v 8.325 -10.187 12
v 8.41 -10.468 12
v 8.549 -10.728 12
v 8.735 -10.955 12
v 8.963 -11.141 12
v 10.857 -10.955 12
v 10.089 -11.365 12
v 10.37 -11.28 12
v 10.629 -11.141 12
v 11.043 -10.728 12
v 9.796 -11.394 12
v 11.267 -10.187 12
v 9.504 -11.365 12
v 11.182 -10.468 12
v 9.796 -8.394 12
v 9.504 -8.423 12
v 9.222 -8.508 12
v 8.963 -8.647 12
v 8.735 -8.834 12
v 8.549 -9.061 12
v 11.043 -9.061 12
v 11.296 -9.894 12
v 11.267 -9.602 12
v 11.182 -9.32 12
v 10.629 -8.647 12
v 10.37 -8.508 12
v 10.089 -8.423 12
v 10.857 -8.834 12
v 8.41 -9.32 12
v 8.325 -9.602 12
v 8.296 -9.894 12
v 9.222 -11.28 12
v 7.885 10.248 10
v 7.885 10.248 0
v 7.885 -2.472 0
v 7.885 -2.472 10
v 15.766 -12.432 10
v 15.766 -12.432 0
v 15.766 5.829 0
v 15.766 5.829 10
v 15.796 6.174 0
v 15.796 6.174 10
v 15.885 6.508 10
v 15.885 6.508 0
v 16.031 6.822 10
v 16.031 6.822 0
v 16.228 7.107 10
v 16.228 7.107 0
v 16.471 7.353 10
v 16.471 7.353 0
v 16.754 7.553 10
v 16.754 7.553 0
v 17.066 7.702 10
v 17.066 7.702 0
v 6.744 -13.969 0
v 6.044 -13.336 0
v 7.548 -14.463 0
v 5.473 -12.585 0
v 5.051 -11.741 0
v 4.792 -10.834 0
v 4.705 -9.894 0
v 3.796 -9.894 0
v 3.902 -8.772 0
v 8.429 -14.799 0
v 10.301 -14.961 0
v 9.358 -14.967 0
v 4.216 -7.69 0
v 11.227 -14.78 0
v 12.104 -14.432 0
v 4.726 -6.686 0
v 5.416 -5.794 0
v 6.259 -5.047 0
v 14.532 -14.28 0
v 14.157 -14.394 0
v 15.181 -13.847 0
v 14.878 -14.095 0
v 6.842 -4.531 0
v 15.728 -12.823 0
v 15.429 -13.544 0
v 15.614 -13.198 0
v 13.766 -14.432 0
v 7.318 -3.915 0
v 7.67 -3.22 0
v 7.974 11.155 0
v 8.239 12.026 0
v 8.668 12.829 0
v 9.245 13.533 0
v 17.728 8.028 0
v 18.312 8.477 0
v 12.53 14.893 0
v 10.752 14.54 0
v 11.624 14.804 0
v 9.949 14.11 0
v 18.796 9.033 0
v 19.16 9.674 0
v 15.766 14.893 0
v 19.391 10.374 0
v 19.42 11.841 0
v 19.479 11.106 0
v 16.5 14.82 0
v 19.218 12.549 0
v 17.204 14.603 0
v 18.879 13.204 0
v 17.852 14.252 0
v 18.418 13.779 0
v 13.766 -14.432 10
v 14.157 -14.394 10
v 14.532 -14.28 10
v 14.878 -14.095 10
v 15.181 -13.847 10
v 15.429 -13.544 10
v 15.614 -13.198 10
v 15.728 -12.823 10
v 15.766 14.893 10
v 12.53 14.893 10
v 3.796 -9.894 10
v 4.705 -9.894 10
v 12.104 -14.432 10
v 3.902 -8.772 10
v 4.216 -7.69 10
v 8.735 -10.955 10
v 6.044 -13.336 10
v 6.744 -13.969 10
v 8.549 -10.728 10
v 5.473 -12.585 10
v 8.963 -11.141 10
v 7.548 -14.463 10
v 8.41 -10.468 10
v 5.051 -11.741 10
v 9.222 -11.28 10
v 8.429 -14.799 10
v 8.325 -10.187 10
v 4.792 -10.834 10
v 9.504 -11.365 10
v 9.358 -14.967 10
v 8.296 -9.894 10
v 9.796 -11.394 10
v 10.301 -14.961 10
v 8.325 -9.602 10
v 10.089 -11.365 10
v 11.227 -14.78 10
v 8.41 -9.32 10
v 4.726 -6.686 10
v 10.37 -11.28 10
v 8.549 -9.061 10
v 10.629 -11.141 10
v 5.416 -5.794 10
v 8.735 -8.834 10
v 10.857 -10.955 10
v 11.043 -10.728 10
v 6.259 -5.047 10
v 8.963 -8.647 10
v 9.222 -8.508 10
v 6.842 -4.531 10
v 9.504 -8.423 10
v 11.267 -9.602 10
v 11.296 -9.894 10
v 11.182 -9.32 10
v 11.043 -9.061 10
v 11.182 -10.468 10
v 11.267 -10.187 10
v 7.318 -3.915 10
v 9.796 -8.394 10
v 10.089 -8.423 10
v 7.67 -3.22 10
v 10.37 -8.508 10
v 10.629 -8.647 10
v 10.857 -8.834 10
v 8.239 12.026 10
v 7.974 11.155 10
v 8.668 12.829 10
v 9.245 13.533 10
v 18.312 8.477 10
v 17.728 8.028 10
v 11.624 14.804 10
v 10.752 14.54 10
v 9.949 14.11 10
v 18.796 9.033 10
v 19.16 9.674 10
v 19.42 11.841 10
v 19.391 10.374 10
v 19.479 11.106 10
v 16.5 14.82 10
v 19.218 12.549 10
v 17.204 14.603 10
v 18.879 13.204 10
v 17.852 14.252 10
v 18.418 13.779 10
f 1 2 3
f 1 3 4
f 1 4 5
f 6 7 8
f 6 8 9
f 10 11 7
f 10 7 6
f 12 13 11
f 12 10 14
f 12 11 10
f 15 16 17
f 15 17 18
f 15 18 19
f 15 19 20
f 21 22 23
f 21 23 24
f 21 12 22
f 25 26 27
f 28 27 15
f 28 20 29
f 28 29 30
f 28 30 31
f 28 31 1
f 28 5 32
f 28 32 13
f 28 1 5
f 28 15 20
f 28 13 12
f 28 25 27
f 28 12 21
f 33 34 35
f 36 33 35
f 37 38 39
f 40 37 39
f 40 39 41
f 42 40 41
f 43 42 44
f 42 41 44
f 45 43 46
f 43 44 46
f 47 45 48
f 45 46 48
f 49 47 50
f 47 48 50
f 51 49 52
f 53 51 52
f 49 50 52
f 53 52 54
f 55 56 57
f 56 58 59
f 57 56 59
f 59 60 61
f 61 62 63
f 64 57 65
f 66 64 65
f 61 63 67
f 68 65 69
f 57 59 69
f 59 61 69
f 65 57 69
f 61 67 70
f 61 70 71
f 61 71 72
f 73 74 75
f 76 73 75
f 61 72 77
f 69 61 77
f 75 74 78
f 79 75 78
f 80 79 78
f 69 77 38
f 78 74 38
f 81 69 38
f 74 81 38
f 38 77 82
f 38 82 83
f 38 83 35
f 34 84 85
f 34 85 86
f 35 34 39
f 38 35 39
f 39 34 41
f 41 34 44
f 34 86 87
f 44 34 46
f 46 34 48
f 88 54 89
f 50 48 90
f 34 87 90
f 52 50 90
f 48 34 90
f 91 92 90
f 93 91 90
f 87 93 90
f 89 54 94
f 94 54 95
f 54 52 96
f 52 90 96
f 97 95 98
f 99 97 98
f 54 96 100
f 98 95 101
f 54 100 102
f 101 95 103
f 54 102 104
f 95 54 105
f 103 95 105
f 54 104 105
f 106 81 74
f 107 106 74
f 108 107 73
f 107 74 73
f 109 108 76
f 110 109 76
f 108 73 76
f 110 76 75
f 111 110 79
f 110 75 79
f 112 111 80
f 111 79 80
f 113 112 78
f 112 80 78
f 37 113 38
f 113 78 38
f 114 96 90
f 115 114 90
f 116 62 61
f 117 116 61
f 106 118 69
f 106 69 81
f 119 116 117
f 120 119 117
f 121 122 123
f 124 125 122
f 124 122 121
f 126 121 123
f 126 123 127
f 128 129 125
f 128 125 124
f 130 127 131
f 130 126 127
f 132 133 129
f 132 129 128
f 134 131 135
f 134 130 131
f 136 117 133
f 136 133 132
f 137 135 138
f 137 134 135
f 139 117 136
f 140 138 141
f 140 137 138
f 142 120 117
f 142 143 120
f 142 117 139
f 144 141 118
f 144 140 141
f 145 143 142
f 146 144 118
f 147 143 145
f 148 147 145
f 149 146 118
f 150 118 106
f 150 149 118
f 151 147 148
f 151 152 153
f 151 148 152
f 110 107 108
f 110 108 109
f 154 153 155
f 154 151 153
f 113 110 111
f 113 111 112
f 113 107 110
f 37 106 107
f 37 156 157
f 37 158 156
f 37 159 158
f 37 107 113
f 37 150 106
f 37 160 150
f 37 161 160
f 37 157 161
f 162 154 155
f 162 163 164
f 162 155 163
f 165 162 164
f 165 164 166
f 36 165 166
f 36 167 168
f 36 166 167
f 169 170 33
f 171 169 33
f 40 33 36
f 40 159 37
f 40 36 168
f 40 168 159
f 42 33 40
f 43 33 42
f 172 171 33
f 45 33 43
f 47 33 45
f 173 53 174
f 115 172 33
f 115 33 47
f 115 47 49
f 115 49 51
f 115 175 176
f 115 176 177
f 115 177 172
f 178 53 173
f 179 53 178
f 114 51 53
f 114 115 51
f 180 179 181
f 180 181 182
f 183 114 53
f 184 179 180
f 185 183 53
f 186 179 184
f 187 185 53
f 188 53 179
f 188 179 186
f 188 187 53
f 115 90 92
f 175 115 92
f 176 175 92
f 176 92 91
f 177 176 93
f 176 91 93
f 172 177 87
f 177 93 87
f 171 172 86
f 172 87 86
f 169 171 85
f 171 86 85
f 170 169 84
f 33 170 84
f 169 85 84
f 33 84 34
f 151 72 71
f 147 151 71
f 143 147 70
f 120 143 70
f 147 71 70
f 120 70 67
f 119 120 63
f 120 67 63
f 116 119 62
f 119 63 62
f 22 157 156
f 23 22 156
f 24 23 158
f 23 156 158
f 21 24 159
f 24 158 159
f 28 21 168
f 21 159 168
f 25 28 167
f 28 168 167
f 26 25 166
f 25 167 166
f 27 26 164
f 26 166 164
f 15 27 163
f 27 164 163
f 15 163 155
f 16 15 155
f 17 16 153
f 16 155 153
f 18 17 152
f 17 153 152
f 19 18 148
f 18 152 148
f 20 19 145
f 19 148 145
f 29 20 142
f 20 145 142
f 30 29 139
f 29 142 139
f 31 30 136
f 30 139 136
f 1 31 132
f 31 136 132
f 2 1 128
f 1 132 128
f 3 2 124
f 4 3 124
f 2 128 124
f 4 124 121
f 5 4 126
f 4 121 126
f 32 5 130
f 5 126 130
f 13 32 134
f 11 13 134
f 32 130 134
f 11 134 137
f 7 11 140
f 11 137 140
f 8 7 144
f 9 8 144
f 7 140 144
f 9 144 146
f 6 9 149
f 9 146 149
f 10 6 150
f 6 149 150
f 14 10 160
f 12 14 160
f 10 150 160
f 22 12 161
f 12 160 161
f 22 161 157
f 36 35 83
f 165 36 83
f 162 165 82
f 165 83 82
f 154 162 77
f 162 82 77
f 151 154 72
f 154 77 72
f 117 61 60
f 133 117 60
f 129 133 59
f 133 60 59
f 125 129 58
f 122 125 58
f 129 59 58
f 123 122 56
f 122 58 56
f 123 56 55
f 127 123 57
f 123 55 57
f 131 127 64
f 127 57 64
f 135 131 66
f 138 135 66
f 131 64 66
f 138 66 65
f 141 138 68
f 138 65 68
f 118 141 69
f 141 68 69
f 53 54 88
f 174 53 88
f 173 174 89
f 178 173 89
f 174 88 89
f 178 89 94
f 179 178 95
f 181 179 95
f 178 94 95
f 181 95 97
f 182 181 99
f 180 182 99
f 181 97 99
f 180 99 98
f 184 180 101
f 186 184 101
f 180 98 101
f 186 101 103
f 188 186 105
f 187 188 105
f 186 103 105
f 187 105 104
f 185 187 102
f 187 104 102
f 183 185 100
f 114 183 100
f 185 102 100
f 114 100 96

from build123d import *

# Parameters (mm, degrees)
BOSS_EXTRUDE2_DEPTH = 10
SKETCH3_R           = 1.5
BOSS_EXTRUDE3_DEPTH = 2


with BuildPart() as part:
    # Sketch1 → Boss-Extrude2 (new body)
    with BuildSketch(Plane.XY):
        with BuildLine():
            Line((7.884962528, 10.248457422), (7.884962528, -2.471687197))
            ThreePointArc((7.884962528, -2.471687197), (7.318196318, -3.914788011), (6.259459635, -5.047413515))
            ThreePointArc((6.259459635, -5.047413515), (4.447305875, -7.175808801), (3.796141897, -9.894255639))
            Line((3.796141897, -9.894255639), (4.70457442, -9.894255639))
            ThreePointArc((4.70457442, -9.894255639), (7.134282097, -14.234596844), (12.104480976, -14.432496496))
            Line((12.104480976, -14.432496496), (13.766372841, -14.432496496))
            ThreePointArc((13.766372841, -14.432496496), (15.180586403, -13.846710058), (15.766372841, -12.432496496))
            Line((15.766372841, -12.432496496), (15.766372841, 5.828797616))
            ThreePointArc((15.766372841, 5.828797616), (16.123155433, 6.968901362), (17.066209392, 7.702235938))
            ThreePointArc((17.066209392, 7.702235938), (19.42011278, 11.840679713), (15.766372841, 14.893180737))
            Line((15.766372841, 14.893180737), (12.529685844, 14.893180737))
            ThreePointArc((12.529685844, 14.893180737), (9.245370491, 13.532772775), (7.884962528, 10.248457422))
        make_face()
    extrude(amount=BOSS_EXTRUDE2_DEPTH)

    # Sketch3 → Boss-Extrude3 (add)
    with BuildSketch(Plane.XY.offset(10)):
        with Locations((9.796141897, -9.894255639)):
            Circle(SKETCH3_R)
    extrude(amount=BOSS_EXTRUDE3_DEPTH)


solid = part.part
